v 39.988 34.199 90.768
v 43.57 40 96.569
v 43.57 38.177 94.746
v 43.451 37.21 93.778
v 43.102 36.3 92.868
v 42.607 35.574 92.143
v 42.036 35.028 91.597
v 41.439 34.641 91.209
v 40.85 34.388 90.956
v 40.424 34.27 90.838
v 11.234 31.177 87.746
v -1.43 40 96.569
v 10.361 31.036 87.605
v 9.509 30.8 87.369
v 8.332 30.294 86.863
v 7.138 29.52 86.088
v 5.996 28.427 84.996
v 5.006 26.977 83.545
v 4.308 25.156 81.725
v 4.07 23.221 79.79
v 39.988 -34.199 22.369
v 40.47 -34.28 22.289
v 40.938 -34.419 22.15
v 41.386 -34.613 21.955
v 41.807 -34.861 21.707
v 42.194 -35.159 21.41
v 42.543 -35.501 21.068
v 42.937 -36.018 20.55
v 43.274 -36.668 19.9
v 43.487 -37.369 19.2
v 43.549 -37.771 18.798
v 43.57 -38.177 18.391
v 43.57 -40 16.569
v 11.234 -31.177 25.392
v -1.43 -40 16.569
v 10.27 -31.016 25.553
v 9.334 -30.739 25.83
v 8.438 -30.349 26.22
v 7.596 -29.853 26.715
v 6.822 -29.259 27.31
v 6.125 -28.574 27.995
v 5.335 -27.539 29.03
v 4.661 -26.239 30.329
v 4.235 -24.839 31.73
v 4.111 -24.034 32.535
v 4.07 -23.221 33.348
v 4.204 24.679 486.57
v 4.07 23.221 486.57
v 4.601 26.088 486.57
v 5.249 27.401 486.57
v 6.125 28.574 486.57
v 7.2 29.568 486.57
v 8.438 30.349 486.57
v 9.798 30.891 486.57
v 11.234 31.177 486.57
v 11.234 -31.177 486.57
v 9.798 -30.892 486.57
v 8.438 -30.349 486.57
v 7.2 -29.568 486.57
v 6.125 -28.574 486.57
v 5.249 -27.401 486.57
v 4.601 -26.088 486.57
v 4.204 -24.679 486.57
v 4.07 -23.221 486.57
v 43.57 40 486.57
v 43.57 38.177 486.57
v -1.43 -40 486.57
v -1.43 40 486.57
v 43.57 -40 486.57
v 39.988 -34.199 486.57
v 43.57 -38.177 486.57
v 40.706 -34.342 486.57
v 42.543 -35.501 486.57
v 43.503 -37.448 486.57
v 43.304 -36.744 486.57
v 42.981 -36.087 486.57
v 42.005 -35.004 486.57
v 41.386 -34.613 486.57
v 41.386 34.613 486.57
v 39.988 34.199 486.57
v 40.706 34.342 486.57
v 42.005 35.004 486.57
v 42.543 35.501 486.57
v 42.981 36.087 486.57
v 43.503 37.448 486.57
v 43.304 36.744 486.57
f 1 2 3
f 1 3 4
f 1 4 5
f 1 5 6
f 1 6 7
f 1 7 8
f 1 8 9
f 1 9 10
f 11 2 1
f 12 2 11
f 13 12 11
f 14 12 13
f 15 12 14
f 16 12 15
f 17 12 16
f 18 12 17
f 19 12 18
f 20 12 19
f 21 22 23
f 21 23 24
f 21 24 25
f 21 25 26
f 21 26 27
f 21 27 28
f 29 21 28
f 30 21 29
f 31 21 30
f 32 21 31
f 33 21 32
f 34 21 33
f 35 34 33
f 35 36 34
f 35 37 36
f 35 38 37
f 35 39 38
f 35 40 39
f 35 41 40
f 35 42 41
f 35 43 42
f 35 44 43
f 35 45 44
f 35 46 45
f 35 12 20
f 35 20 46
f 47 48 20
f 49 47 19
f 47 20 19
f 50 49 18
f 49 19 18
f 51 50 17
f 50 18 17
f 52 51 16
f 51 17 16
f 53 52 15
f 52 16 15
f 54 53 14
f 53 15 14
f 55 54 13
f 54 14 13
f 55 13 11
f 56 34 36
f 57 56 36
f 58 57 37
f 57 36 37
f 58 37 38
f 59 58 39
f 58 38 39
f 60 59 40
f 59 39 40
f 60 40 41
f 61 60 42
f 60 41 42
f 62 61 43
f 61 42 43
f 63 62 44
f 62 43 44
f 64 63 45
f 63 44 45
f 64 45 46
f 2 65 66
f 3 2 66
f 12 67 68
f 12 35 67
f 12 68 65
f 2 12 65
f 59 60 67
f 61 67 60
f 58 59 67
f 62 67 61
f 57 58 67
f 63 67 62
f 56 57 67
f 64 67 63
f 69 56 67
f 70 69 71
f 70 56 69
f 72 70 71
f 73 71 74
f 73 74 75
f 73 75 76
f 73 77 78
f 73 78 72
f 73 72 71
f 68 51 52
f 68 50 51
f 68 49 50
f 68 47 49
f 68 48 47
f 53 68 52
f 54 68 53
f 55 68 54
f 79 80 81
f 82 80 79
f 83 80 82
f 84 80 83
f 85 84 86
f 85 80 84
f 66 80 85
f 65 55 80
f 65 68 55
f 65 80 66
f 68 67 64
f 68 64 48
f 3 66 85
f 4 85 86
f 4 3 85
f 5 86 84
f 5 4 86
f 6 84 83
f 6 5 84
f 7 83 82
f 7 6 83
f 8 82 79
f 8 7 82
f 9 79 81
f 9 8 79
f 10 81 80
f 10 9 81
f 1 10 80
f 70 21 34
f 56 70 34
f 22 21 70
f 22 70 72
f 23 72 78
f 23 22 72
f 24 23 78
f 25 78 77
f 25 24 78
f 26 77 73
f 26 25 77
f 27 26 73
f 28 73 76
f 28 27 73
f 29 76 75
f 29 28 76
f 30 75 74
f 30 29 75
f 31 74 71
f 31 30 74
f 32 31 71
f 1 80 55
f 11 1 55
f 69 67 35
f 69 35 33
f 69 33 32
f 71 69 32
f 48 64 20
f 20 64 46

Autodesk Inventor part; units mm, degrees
ref_plane "Начальная плоскость" through (0, 0, 16.5685) normal (0, 0, 1) x (1, 0, 0)
ref_plane "Конечная плоскость" through (0, 0, 486.57) normal (0, 0, 1) x (1, 0, 0)
sketch "Эскиз" plane through (0, 0, 0) normal (0, 0, 1) x (1, 0, 0)
  line L0 (-1.43, 0) -> (-1.43, 40)
  line L1 (-1.43, 40) -> (43.57, 40)
  line L2 (43.57, 40) -> (43.57, 38.1774)
  line L3 (39.9881, 34.1993) -> (11.2338, 31.1771)
  line L4 (4.07, 23.221) -> (4.07, 0)
  line L5 (4.07, 0) -> (-1.43, 0) construction
  line L6 (23.82, 40) -> (23.82, 32.5) construction
  line L7 (43.57, 34.5758) -> (43.57, 32.5) construction
  line L8 (43.57, 32.5) -> (23.82, 32.5) construction
  line L9 (0, 15) -> (0, -27) construction
  line L10 (-5.539, 0) -> (16.0067, 0) construction
  line L11 (-1.43, 0) -> (-1.43, -40)
  line L12 (-1.43, -40) -> (43.57, -40)
  line L13 (43.57, -40) -> (43.57, -38.1774)
  line L14 (39.9881, -34.1993) -> (11.2338, -31.1771)
  line L15 (4.07, -23.221) -> (4.07, 0)
  arc A0 (11.2338, 31.1771) -> (4.07, 23.221) centre (12.07, 23.221) ccw
  arc A1 (4.07, -23.221) -> (11.2338, -31.1771) centre (12.07, -23.221) ccw
  arc A2 (39.9881, 34.1993) -> (43.57, 38.1774) centre (39.57, 38.1774) ccw
  arc A3 (43.57, -38.1774) -> (39.9881, -34.1993) centre (39.57, -38.1774) ccw
  line L16 (0, 56) -> (0, -56) construction
  line L17 (-15.5135, 0) -> (54.308, 0) construction
  point P0 (4.07, 30.4242)
  point P1 (43.57, -34.5758)
  point P2 (4.07, -30.4242)
  point P3 (23.82, -40)
  point P4 (23.82, -32.5)
  dimension "d0" = 5.5
  dimension "d1" = 40
  dimension "d2" = 45
  dimension "d3" = 7.5
  dimension "d4" = 19.75
  dimension "d5" = 2.0758
  dimension "d23" = 8
  dimension "d24" = 4
  dimension "d25" = 1.43
extrude "Тело" add sketch "Эскиз" along normal up to surface (470.0015 mm away) from surface at 16.5685
sketch "Sketch3" plane through (0, 0, 0) normal (0, 0, 1) x (1, 0, 0)
  line L0 (0, 0) -> (10, 0)
ref_plane "Work Plane3" through (0, 0, 0) normal (0, -1, 0) x (1, 0, 0)
sketch "Sketch4" plane through (0, 0, 0) normal (0, -1, 0) x (1, 0, 0)
  line L0 (-2, 16.5685) -> (12, 16.5685)
  line L1 (-2, 486.57) -> (12, 486.57)
  dimension "d29" = 470.0015
ref_plane "РабПлоскость4" through (43.57, -128.2843, -71.7157) normal (0, 0.7071, -0.7071) x (1, 0, 0)
split "Разделение1" plane through (43.57, -128.2843, -71.7157) removes the side toward (0, 0.7071, -0.7071)
ref_plane "РабПлоскость5" through (43.57, 220, 486.57) normal (0, 0, 1) x (1, 0, 0)
split "Разделение2" plane through (43.57, 220, 486.57) removes the side toward (0, 0, 1)
equation "\"d0\" = G_T"
equation "\"d1\" = 0.5 * G_H"
equation "\"d2\" = G_W"
equation "\"d3\" = G_T1"
equation "\"d4\" = G_C"
equation "\"d23\" = G_IR"
equation "\"d24\" = G_ER"
equation "\"d25\" = ex"
equation "\"d6\" = G_L"
equation "\"G_W\" = 45"
equation "\"G_T\" = 5.5"
equation "\"G_T1\" = 7.5"
equation "\"G_NG\" = 0.105104"
equation "\"G_ER\" = 4"
equation "\"G_IR\" = 8"
equation "\"G_C\" = 19.75"
equation "\"G_L\" = d29"
equation "\"ex\" = 1.43"
equation "\"G_OFFSET_START\" = -16.56854"
equation "\"d26\" = -G_OFFSET_START"
equation "\"d27\" = G_OFFSET_END + B_L"
equation "\"B_L\" = 526.57"
equation "\"G_H\" = 80"
equation "\"G_OFFSET_END\" = -40"
properties part number "ISO 657/11 - CH 80 x 8 - 470" material "Сталь, мягкая"
